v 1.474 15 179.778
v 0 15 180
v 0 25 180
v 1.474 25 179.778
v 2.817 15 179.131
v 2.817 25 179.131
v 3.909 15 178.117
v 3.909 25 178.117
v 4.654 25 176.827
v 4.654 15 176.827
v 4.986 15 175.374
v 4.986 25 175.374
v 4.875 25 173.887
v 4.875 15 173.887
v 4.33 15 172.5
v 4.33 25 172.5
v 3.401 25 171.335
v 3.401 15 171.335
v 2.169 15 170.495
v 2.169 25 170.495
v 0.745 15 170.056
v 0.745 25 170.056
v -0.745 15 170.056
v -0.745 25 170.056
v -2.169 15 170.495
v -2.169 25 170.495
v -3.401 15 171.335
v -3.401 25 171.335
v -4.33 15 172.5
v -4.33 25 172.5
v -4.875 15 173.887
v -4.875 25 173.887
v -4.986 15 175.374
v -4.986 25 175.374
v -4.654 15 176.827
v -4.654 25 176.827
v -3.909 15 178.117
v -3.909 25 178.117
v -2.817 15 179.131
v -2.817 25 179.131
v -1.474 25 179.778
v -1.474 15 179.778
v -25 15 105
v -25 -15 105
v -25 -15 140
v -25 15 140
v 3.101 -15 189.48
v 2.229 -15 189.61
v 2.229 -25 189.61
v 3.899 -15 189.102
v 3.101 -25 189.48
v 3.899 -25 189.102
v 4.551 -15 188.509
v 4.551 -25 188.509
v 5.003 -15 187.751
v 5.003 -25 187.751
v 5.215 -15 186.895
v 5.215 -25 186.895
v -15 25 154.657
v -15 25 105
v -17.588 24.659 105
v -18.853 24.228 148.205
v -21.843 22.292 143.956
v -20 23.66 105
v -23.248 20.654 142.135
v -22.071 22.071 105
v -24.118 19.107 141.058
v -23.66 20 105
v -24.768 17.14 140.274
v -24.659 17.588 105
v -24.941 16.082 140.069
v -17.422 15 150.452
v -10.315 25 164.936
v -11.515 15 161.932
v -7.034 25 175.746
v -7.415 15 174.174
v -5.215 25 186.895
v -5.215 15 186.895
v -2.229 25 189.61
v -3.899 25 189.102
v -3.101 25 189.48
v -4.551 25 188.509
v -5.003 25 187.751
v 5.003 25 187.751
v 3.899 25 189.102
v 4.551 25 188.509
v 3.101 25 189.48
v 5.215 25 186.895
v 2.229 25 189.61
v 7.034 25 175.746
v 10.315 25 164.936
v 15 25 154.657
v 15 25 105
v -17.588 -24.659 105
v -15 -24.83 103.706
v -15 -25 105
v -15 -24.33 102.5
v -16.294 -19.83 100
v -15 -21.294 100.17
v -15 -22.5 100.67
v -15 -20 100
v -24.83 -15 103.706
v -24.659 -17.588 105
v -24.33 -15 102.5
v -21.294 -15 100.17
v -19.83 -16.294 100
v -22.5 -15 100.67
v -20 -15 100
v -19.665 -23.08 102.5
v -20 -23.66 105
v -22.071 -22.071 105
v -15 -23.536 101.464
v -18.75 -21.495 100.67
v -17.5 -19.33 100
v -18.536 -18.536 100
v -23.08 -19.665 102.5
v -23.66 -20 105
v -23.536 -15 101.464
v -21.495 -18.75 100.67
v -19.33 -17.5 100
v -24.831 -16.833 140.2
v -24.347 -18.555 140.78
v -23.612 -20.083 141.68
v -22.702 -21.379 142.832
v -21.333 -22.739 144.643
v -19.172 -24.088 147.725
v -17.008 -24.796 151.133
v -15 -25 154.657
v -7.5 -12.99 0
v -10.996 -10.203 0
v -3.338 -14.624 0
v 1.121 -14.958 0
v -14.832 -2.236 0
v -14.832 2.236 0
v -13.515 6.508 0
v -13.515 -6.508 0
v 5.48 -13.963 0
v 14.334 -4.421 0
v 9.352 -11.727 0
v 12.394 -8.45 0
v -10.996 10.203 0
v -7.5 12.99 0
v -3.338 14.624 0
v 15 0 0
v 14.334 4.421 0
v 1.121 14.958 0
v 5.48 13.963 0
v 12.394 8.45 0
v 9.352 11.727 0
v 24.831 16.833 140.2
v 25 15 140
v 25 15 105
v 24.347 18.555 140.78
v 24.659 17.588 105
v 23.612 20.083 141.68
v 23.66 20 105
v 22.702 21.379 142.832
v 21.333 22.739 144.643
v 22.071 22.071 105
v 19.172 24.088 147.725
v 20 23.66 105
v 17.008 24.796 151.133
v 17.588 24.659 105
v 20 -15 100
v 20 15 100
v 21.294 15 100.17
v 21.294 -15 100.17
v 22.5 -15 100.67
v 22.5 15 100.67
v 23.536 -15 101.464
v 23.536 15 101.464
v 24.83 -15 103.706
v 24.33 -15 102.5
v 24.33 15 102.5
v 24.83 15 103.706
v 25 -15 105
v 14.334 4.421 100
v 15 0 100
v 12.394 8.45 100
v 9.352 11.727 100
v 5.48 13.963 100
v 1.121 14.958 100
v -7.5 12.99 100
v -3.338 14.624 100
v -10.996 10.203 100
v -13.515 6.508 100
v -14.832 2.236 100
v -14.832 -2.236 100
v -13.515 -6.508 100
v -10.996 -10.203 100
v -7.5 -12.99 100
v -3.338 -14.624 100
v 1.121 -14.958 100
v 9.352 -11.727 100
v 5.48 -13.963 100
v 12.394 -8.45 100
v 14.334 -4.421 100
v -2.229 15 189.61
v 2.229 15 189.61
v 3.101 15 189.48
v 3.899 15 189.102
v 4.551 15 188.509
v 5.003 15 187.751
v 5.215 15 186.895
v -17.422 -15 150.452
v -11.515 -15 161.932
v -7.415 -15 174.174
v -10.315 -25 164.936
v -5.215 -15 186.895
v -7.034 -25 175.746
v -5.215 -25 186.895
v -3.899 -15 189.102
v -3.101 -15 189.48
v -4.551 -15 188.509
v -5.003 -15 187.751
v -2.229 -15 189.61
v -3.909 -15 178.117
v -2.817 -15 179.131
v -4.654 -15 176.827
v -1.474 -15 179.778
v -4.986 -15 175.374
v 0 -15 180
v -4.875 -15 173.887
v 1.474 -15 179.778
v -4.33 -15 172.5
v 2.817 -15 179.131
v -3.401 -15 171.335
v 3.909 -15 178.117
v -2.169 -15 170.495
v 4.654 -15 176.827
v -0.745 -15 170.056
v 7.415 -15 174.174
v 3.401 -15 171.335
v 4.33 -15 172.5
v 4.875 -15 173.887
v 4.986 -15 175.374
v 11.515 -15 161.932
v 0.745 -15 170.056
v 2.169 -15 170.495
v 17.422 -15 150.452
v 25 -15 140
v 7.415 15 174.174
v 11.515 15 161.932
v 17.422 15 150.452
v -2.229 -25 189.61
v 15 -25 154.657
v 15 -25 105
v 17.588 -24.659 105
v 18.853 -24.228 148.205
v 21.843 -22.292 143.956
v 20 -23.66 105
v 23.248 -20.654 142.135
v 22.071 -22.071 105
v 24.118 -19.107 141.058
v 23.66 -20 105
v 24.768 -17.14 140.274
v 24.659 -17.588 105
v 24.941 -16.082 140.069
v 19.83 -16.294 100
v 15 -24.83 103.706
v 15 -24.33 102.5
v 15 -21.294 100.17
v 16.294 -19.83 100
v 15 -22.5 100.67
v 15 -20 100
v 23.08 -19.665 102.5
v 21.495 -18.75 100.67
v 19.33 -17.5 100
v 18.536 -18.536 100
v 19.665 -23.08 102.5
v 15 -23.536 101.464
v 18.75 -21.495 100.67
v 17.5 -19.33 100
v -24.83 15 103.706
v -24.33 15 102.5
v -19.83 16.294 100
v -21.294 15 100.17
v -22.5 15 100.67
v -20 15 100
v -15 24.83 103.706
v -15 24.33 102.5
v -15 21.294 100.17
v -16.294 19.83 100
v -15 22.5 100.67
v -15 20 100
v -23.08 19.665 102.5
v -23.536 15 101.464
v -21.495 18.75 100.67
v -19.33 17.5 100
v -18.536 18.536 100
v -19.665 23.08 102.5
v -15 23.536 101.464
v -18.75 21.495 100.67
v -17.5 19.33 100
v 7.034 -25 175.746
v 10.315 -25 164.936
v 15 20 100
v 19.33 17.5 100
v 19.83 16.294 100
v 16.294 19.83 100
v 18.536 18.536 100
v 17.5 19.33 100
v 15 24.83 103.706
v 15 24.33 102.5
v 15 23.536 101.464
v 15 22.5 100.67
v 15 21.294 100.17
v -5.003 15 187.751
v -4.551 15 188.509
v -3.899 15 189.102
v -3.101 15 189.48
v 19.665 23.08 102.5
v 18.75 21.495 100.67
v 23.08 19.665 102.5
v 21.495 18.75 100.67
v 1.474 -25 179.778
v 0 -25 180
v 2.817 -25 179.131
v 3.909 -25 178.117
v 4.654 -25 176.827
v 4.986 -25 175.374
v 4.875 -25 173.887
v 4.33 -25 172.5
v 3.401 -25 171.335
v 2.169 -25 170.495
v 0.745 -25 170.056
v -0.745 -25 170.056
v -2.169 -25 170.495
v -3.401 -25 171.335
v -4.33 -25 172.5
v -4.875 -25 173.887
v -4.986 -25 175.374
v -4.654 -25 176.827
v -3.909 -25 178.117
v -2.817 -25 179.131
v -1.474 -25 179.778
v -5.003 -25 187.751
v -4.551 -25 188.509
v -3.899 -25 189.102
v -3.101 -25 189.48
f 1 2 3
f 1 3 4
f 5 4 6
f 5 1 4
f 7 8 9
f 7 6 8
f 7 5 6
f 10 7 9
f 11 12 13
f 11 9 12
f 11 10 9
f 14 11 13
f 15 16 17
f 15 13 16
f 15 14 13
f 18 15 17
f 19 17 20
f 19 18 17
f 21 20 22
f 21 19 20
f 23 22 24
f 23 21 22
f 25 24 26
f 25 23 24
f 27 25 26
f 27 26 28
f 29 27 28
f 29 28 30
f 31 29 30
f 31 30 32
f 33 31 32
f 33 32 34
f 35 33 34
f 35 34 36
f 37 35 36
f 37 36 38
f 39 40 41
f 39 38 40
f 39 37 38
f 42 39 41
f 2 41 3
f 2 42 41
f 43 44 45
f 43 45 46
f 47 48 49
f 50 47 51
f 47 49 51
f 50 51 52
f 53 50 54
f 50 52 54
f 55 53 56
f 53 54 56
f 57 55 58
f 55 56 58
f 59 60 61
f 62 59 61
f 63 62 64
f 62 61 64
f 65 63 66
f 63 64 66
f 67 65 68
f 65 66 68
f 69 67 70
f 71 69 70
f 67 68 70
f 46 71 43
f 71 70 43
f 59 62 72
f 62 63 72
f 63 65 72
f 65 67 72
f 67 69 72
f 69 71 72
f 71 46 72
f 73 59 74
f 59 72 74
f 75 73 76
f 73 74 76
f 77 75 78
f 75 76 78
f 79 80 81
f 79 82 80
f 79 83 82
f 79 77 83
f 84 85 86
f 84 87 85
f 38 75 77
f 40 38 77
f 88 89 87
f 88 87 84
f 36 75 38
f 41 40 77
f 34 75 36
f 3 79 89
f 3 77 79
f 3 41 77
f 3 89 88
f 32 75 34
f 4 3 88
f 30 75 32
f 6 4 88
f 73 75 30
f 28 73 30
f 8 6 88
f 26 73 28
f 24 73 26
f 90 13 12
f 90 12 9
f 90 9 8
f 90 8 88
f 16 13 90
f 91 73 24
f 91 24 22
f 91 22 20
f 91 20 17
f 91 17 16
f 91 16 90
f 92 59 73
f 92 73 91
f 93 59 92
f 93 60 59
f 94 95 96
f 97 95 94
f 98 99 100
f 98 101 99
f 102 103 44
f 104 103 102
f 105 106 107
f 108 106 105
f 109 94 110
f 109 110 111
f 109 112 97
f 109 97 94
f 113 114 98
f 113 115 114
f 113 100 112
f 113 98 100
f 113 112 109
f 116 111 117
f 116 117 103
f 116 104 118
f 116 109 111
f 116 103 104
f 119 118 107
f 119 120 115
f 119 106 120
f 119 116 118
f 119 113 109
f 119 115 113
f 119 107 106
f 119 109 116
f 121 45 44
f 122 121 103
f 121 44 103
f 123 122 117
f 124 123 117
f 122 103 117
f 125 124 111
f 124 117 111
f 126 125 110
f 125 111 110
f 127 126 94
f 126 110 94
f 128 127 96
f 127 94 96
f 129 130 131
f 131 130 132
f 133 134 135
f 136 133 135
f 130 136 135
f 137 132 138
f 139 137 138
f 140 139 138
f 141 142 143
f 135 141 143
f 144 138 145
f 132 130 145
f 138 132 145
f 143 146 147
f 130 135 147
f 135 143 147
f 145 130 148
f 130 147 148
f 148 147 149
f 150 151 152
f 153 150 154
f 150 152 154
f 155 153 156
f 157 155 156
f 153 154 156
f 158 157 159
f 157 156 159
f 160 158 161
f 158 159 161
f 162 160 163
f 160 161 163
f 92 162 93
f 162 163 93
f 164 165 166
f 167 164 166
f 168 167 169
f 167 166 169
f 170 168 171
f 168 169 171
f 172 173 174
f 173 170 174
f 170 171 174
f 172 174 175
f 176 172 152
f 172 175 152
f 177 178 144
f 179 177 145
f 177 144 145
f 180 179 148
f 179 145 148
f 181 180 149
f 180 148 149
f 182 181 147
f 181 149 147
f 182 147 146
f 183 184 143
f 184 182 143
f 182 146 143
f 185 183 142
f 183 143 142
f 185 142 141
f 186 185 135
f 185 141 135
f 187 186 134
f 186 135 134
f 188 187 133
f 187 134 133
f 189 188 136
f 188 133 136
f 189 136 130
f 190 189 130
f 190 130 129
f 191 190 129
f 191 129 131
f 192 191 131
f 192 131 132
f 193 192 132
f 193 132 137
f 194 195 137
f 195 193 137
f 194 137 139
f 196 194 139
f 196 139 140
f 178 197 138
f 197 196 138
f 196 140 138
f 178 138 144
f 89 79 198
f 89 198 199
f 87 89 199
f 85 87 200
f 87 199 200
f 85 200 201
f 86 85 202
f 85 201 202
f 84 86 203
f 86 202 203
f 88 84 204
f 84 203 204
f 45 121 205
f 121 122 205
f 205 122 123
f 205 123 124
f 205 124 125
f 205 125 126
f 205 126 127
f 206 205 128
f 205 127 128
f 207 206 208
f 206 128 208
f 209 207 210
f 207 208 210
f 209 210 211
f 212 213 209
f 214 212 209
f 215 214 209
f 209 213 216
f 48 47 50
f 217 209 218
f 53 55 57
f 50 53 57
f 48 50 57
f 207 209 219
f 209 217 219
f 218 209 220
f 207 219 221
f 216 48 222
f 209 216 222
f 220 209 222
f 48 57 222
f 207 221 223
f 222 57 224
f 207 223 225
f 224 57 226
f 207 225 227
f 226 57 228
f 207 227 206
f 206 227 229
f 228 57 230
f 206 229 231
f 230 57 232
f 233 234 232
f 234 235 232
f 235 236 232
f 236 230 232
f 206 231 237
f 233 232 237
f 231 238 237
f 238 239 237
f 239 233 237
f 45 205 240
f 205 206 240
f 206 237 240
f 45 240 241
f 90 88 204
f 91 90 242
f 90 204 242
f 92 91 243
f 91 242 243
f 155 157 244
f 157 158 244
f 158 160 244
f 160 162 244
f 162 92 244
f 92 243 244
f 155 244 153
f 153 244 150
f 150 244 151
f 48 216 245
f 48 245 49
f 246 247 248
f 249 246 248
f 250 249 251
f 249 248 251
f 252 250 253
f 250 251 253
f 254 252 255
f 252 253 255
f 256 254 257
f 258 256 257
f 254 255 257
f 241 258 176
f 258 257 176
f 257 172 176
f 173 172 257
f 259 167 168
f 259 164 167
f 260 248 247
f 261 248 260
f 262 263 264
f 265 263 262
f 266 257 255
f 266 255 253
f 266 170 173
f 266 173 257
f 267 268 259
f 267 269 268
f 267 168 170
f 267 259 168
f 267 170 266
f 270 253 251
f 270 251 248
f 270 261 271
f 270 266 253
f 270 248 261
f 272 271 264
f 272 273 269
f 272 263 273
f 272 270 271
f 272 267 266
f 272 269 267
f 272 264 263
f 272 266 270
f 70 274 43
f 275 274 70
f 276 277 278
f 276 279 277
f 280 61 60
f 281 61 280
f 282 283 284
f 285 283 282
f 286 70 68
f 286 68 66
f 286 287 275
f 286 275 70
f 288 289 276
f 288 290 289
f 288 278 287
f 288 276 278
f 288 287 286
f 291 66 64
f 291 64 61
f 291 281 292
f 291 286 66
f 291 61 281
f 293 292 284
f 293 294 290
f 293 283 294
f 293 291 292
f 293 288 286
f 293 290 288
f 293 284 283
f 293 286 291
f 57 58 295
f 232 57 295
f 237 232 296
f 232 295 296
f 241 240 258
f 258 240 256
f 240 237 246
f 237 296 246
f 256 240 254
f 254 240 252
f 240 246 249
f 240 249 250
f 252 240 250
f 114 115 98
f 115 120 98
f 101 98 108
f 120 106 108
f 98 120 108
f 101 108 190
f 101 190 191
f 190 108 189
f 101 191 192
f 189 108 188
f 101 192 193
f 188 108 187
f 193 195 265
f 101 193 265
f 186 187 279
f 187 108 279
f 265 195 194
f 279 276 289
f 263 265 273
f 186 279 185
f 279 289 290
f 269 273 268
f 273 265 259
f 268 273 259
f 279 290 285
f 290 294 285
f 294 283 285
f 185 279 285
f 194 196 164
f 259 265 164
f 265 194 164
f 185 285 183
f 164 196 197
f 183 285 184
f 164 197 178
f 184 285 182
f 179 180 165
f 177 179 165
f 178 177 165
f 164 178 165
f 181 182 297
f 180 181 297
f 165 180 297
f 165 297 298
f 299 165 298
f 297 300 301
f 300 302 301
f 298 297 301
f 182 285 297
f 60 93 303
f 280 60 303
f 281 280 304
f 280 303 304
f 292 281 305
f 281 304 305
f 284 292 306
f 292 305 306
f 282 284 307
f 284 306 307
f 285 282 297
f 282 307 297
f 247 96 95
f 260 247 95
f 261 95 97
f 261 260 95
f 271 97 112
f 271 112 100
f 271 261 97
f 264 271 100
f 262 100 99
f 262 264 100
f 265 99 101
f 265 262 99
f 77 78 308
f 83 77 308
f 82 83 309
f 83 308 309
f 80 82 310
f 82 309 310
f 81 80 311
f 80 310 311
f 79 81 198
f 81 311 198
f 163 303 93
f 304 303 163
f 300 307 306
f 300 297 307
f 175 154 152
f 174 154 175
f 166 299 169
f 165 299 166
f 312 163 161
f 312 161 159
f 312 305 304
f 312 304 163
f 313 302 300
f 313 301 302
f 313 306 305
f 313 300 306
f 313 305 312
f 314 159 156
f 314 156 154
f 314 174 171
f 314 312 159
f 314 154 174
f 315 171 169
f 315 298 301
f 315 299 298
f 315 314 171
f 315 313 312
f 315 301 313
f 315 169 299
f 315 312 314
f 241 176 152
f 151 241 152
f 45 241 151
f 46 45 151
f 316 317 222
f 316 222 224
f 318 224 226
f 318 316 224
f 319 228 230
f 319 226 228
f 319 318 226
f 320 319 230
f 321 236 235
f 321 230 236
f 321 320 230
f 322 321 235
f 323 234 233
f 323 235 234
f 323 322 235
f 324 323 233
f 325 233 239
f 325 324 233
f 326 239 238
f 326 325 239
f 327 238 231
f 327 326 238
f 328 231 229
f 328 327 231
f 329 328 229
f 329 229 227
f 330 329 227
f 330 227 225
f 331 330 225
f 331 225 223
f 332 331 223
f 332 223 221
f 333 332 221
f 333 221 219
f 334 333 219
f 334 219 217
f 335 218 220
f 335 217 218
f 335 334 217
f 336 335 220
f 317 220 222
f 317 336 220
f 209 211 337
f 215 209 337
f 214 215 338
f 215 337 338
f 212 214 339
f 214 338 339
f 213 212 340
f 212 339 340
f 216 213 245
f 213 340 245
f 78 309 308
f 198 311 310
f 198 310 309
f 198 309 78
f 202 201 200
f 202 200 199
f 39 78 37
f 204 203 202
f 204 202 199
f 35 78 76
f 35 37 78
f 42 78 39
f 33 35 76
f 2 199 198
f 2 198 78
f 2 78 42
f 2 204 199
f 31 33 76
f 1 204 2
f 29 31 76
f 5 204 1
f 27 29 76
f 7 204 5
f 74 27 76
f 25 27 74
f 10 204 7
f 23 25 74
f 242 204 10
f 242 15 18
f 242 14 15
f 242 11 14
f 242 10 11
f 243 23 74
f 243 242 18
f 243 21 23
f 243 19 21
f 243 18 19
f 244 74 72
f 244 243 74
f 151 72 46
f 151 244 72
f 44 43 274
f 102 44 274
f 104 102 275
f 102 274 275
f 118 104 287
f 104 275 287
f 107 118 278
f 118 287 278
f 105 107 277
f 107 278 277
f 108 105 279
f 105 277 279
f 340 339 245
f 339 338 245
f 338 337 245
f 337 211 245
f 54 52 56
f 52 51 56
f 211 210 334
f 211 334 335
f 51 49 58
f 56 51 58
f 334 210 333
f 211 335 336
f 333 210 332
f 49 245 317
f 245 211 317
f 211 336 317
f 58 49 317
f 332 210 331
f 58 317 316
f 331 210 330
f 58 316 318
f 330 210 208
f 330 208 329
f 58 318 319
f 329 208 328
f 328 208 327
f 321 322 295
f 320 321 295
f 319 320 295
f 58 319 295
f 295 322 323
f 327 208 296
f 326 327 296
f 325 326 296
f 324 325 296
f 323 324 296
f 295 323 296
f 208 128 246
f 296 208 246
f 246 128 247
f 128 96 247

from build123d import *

# Parameters (mm, degrees)
SKETCH2_R               = 15
BOSS_EXTRUDE2_DEPTH     = 140
SKETCH4_W               = 50
SKETCH4_H               = 50
BOSS_EXTRUDE3_DEPTH     = 89.61
FILLET1_R               = 5
FILLET3_R               = 10
SKETCH6_W               = 49.61
SKETCH6_H               = 30
CUT_EXTRUDE1_DEPTH      = 44.805
CUT_EXTRUDE5_DEPTH      = 193.878075737
CUT_EXTRUDE5_DEPTH_BACK = 193.878075737
SKETCH7_R               = 5


with BuildPart() as part:
    # Sketch2 → Boss-Extrude2 (new body)
    with BuildSketch(Plane.XY):
        Circle(SKETCH2_R)
    extrude(amount=BOSS_EXTRUDE2_DEPTH)

    # Sketch4 → Boss-Extrude3 (add)
    with BuildSketch(Plane.XY.offset(100)):
        Rectangle(SKETCH4_W, SKETCH4_H)
    extrude(amount=BOSS_EXTRUDE3_DEPTH)

    # Fillet1
    fillet1_edges = [part.edges().sort_by_distance(p)[0] for p in [
        (25, 0, 100),
        (0, 25, 100),
        (-25, 0, 100),
        (0, -25, 100),
    ]]
    fillet(fillet1_edges, radius=FILLET1_R)

    # Fillet3
    # the kernel refuses this fillet: 10 mm, written as the material it takes off along each edge
    with BuildSketch(Plane(origin=(15, 15, 100), x_dir=(0, 1, 0), z_dir=(-1, 0, 0))) as fillet3_piece_1:
        with BuildLine():
            CenterArc((5, -5), 5, 0, 90)
            Line((10, -5), (10, 0))
            Line((10, 0), (5, 0))
        make_face()
    revolve(axis=Axis((15, 15, 100), (0, 0, -1)), revolution_arc=90, mode=Mode.SUBTRACT)
    with BuildSketch(Plane(origin=(15, -15, 100), x_dir=(1, 0, 0), z_dir=(0, 1, 0))) as fillet3_piece_2:
        with BuildLine():
            CenterArc((5, -5), 5, 0, 90)
            Line((10, -5), (10, 0))
            Line((10, 0), (5, 0))
        make_face()
    revolve(axis=Axis((15, -15, 100), (0, 0, -1)), revolution_arc=90, mode=Mode.SUBTRACT)
    with BuildSketch(Plane(origin=(-15, 15, 100), x_dir=(-1, 0, 0), z_dir=(0, -1, 0))) as fillet3_piece_3:
        with BuildLine():
            CenterArc((5, -5), 5, 0, 90)
            Line((10, -5), (10, 0))
            Line((10, 0), (5, 0))
        make_face()
    revolve(axis=Axis((-15, 15, 100), (0, 0, -1)), revolution_arc=90, mode=Mode.SUBTRACT)
    with BuildSketch(Plane(origin=(-15, -15, 100), x_dir=(0, -1, 0), z_dir=(1, 0, 0))) as fillet3_piece_4:
        with BuildLine():
            CenterArc((5, -5), 5, 0, 90)
            Line((10, -5), (10, 0))
            Line((10, 0), (5, 0))
        make_face()
    revolve(axis=Axis((-15, -15, 100), (0, 0, -1)), revolution_arc=90, mode=Mode.SUBTRACT)
    with BuildSketch(Plane(origin=(25, -25, 100), x_dir=(0, 1, 0), z_dir=(0, 0, 1)), Plane(origin=(-25, -25, 100), x_dir=(1, 0, 0), z_dir=(0, 0, 1))) as fillet3_piece_5:
        with BuildLine():
            CenterArc((FILLET3_R, FILLET3_R), FILLET3_R, 180, 90)
            Line((0, FILLET3_R), (0, 0))
            Line((0, 0), (FILLET3_R, 0))
        make_face()
    extrude(amount=114.61, mode=Mode.SUBTRACT)
    with BuildSketch(Plane(origin=(25, 25, 100), x_dir=(0, -1, 0), z_dir=(0, 0, 1)), Plane(origin=(-25, 25, 100), x_dir=(1, 0, 0), z_dir=(0, 0, 1))) as fillet3_piece_6:
        with BuildLine():
            CenterArc((FILLET3_R, -FILLET3_R), FILLET3_R, 90, 90)
            Line((0, -FILLET3_R), (0, 0))
            Line((0, 0), (FILLET3_R, 0))
        make_face()
    extrude(amount=114.61, mode=Mode.SUBTRACT)

    # Sketch6 → Cut-Extrude1 (cut, symmetric)
    with BuildSketch(Plane(origin=(0, 0, 0), x_dir=(0, 0, -1), z_dir=(1, 0, 0))):
        with Locations((-164.805, 0)):
            Rectangle(SKETCH6_W, SKETCH6_H)
    extrude(amount=CUT_EXTRUDE1_DEPTH, both=True, mode=Mode.SUBTRACT)

    # Sketch7 → Cut-Extrude5 (cut, two sides: drawn at the far end of the back side and taken through both)
    with BuildSketch(Plane(origin=(0, 0, 0), x_dir=(1, 0, 0), z_dir=(0, 1, 0)).offset(-CUT_EXTRUDE5_DEPTH_BACK)):
        with Locations(Location((0, -175, 0), (0, 0, 270))):
            Circle(SKETCH7_R)
        with BuildLine():
            Line((-2.228917094, -189.61), (2.228917094, -189.61))
            ThreePointArc((2.228917094, -189.61), (4.246928068, -188.829826954), (5.21534053, -186.895087804))
            ThreePointArc((5.21534053, -186.895087804), (11.515192631, -161.931906551), (25, -140))
            ThreePointArc((25, -140), (0, -208.138826335), (-25, -140))
            ThreePointArc((-25, -140), (-11.515192631, -161.931906551), (-5.21534053, -186.895087804))
            ThreePointArc((-5.21534053, -186.895087804), (-4.246928068, -188.829826954), (-2.228917094, -189.61))
        make_face()
    extrude(amount=CUT_EXTRUDE5_DEPTH + CUT_EXTRUDE5_DEPTH_BACK, mode=Mode.SUBTRACT)


solid = part.part
